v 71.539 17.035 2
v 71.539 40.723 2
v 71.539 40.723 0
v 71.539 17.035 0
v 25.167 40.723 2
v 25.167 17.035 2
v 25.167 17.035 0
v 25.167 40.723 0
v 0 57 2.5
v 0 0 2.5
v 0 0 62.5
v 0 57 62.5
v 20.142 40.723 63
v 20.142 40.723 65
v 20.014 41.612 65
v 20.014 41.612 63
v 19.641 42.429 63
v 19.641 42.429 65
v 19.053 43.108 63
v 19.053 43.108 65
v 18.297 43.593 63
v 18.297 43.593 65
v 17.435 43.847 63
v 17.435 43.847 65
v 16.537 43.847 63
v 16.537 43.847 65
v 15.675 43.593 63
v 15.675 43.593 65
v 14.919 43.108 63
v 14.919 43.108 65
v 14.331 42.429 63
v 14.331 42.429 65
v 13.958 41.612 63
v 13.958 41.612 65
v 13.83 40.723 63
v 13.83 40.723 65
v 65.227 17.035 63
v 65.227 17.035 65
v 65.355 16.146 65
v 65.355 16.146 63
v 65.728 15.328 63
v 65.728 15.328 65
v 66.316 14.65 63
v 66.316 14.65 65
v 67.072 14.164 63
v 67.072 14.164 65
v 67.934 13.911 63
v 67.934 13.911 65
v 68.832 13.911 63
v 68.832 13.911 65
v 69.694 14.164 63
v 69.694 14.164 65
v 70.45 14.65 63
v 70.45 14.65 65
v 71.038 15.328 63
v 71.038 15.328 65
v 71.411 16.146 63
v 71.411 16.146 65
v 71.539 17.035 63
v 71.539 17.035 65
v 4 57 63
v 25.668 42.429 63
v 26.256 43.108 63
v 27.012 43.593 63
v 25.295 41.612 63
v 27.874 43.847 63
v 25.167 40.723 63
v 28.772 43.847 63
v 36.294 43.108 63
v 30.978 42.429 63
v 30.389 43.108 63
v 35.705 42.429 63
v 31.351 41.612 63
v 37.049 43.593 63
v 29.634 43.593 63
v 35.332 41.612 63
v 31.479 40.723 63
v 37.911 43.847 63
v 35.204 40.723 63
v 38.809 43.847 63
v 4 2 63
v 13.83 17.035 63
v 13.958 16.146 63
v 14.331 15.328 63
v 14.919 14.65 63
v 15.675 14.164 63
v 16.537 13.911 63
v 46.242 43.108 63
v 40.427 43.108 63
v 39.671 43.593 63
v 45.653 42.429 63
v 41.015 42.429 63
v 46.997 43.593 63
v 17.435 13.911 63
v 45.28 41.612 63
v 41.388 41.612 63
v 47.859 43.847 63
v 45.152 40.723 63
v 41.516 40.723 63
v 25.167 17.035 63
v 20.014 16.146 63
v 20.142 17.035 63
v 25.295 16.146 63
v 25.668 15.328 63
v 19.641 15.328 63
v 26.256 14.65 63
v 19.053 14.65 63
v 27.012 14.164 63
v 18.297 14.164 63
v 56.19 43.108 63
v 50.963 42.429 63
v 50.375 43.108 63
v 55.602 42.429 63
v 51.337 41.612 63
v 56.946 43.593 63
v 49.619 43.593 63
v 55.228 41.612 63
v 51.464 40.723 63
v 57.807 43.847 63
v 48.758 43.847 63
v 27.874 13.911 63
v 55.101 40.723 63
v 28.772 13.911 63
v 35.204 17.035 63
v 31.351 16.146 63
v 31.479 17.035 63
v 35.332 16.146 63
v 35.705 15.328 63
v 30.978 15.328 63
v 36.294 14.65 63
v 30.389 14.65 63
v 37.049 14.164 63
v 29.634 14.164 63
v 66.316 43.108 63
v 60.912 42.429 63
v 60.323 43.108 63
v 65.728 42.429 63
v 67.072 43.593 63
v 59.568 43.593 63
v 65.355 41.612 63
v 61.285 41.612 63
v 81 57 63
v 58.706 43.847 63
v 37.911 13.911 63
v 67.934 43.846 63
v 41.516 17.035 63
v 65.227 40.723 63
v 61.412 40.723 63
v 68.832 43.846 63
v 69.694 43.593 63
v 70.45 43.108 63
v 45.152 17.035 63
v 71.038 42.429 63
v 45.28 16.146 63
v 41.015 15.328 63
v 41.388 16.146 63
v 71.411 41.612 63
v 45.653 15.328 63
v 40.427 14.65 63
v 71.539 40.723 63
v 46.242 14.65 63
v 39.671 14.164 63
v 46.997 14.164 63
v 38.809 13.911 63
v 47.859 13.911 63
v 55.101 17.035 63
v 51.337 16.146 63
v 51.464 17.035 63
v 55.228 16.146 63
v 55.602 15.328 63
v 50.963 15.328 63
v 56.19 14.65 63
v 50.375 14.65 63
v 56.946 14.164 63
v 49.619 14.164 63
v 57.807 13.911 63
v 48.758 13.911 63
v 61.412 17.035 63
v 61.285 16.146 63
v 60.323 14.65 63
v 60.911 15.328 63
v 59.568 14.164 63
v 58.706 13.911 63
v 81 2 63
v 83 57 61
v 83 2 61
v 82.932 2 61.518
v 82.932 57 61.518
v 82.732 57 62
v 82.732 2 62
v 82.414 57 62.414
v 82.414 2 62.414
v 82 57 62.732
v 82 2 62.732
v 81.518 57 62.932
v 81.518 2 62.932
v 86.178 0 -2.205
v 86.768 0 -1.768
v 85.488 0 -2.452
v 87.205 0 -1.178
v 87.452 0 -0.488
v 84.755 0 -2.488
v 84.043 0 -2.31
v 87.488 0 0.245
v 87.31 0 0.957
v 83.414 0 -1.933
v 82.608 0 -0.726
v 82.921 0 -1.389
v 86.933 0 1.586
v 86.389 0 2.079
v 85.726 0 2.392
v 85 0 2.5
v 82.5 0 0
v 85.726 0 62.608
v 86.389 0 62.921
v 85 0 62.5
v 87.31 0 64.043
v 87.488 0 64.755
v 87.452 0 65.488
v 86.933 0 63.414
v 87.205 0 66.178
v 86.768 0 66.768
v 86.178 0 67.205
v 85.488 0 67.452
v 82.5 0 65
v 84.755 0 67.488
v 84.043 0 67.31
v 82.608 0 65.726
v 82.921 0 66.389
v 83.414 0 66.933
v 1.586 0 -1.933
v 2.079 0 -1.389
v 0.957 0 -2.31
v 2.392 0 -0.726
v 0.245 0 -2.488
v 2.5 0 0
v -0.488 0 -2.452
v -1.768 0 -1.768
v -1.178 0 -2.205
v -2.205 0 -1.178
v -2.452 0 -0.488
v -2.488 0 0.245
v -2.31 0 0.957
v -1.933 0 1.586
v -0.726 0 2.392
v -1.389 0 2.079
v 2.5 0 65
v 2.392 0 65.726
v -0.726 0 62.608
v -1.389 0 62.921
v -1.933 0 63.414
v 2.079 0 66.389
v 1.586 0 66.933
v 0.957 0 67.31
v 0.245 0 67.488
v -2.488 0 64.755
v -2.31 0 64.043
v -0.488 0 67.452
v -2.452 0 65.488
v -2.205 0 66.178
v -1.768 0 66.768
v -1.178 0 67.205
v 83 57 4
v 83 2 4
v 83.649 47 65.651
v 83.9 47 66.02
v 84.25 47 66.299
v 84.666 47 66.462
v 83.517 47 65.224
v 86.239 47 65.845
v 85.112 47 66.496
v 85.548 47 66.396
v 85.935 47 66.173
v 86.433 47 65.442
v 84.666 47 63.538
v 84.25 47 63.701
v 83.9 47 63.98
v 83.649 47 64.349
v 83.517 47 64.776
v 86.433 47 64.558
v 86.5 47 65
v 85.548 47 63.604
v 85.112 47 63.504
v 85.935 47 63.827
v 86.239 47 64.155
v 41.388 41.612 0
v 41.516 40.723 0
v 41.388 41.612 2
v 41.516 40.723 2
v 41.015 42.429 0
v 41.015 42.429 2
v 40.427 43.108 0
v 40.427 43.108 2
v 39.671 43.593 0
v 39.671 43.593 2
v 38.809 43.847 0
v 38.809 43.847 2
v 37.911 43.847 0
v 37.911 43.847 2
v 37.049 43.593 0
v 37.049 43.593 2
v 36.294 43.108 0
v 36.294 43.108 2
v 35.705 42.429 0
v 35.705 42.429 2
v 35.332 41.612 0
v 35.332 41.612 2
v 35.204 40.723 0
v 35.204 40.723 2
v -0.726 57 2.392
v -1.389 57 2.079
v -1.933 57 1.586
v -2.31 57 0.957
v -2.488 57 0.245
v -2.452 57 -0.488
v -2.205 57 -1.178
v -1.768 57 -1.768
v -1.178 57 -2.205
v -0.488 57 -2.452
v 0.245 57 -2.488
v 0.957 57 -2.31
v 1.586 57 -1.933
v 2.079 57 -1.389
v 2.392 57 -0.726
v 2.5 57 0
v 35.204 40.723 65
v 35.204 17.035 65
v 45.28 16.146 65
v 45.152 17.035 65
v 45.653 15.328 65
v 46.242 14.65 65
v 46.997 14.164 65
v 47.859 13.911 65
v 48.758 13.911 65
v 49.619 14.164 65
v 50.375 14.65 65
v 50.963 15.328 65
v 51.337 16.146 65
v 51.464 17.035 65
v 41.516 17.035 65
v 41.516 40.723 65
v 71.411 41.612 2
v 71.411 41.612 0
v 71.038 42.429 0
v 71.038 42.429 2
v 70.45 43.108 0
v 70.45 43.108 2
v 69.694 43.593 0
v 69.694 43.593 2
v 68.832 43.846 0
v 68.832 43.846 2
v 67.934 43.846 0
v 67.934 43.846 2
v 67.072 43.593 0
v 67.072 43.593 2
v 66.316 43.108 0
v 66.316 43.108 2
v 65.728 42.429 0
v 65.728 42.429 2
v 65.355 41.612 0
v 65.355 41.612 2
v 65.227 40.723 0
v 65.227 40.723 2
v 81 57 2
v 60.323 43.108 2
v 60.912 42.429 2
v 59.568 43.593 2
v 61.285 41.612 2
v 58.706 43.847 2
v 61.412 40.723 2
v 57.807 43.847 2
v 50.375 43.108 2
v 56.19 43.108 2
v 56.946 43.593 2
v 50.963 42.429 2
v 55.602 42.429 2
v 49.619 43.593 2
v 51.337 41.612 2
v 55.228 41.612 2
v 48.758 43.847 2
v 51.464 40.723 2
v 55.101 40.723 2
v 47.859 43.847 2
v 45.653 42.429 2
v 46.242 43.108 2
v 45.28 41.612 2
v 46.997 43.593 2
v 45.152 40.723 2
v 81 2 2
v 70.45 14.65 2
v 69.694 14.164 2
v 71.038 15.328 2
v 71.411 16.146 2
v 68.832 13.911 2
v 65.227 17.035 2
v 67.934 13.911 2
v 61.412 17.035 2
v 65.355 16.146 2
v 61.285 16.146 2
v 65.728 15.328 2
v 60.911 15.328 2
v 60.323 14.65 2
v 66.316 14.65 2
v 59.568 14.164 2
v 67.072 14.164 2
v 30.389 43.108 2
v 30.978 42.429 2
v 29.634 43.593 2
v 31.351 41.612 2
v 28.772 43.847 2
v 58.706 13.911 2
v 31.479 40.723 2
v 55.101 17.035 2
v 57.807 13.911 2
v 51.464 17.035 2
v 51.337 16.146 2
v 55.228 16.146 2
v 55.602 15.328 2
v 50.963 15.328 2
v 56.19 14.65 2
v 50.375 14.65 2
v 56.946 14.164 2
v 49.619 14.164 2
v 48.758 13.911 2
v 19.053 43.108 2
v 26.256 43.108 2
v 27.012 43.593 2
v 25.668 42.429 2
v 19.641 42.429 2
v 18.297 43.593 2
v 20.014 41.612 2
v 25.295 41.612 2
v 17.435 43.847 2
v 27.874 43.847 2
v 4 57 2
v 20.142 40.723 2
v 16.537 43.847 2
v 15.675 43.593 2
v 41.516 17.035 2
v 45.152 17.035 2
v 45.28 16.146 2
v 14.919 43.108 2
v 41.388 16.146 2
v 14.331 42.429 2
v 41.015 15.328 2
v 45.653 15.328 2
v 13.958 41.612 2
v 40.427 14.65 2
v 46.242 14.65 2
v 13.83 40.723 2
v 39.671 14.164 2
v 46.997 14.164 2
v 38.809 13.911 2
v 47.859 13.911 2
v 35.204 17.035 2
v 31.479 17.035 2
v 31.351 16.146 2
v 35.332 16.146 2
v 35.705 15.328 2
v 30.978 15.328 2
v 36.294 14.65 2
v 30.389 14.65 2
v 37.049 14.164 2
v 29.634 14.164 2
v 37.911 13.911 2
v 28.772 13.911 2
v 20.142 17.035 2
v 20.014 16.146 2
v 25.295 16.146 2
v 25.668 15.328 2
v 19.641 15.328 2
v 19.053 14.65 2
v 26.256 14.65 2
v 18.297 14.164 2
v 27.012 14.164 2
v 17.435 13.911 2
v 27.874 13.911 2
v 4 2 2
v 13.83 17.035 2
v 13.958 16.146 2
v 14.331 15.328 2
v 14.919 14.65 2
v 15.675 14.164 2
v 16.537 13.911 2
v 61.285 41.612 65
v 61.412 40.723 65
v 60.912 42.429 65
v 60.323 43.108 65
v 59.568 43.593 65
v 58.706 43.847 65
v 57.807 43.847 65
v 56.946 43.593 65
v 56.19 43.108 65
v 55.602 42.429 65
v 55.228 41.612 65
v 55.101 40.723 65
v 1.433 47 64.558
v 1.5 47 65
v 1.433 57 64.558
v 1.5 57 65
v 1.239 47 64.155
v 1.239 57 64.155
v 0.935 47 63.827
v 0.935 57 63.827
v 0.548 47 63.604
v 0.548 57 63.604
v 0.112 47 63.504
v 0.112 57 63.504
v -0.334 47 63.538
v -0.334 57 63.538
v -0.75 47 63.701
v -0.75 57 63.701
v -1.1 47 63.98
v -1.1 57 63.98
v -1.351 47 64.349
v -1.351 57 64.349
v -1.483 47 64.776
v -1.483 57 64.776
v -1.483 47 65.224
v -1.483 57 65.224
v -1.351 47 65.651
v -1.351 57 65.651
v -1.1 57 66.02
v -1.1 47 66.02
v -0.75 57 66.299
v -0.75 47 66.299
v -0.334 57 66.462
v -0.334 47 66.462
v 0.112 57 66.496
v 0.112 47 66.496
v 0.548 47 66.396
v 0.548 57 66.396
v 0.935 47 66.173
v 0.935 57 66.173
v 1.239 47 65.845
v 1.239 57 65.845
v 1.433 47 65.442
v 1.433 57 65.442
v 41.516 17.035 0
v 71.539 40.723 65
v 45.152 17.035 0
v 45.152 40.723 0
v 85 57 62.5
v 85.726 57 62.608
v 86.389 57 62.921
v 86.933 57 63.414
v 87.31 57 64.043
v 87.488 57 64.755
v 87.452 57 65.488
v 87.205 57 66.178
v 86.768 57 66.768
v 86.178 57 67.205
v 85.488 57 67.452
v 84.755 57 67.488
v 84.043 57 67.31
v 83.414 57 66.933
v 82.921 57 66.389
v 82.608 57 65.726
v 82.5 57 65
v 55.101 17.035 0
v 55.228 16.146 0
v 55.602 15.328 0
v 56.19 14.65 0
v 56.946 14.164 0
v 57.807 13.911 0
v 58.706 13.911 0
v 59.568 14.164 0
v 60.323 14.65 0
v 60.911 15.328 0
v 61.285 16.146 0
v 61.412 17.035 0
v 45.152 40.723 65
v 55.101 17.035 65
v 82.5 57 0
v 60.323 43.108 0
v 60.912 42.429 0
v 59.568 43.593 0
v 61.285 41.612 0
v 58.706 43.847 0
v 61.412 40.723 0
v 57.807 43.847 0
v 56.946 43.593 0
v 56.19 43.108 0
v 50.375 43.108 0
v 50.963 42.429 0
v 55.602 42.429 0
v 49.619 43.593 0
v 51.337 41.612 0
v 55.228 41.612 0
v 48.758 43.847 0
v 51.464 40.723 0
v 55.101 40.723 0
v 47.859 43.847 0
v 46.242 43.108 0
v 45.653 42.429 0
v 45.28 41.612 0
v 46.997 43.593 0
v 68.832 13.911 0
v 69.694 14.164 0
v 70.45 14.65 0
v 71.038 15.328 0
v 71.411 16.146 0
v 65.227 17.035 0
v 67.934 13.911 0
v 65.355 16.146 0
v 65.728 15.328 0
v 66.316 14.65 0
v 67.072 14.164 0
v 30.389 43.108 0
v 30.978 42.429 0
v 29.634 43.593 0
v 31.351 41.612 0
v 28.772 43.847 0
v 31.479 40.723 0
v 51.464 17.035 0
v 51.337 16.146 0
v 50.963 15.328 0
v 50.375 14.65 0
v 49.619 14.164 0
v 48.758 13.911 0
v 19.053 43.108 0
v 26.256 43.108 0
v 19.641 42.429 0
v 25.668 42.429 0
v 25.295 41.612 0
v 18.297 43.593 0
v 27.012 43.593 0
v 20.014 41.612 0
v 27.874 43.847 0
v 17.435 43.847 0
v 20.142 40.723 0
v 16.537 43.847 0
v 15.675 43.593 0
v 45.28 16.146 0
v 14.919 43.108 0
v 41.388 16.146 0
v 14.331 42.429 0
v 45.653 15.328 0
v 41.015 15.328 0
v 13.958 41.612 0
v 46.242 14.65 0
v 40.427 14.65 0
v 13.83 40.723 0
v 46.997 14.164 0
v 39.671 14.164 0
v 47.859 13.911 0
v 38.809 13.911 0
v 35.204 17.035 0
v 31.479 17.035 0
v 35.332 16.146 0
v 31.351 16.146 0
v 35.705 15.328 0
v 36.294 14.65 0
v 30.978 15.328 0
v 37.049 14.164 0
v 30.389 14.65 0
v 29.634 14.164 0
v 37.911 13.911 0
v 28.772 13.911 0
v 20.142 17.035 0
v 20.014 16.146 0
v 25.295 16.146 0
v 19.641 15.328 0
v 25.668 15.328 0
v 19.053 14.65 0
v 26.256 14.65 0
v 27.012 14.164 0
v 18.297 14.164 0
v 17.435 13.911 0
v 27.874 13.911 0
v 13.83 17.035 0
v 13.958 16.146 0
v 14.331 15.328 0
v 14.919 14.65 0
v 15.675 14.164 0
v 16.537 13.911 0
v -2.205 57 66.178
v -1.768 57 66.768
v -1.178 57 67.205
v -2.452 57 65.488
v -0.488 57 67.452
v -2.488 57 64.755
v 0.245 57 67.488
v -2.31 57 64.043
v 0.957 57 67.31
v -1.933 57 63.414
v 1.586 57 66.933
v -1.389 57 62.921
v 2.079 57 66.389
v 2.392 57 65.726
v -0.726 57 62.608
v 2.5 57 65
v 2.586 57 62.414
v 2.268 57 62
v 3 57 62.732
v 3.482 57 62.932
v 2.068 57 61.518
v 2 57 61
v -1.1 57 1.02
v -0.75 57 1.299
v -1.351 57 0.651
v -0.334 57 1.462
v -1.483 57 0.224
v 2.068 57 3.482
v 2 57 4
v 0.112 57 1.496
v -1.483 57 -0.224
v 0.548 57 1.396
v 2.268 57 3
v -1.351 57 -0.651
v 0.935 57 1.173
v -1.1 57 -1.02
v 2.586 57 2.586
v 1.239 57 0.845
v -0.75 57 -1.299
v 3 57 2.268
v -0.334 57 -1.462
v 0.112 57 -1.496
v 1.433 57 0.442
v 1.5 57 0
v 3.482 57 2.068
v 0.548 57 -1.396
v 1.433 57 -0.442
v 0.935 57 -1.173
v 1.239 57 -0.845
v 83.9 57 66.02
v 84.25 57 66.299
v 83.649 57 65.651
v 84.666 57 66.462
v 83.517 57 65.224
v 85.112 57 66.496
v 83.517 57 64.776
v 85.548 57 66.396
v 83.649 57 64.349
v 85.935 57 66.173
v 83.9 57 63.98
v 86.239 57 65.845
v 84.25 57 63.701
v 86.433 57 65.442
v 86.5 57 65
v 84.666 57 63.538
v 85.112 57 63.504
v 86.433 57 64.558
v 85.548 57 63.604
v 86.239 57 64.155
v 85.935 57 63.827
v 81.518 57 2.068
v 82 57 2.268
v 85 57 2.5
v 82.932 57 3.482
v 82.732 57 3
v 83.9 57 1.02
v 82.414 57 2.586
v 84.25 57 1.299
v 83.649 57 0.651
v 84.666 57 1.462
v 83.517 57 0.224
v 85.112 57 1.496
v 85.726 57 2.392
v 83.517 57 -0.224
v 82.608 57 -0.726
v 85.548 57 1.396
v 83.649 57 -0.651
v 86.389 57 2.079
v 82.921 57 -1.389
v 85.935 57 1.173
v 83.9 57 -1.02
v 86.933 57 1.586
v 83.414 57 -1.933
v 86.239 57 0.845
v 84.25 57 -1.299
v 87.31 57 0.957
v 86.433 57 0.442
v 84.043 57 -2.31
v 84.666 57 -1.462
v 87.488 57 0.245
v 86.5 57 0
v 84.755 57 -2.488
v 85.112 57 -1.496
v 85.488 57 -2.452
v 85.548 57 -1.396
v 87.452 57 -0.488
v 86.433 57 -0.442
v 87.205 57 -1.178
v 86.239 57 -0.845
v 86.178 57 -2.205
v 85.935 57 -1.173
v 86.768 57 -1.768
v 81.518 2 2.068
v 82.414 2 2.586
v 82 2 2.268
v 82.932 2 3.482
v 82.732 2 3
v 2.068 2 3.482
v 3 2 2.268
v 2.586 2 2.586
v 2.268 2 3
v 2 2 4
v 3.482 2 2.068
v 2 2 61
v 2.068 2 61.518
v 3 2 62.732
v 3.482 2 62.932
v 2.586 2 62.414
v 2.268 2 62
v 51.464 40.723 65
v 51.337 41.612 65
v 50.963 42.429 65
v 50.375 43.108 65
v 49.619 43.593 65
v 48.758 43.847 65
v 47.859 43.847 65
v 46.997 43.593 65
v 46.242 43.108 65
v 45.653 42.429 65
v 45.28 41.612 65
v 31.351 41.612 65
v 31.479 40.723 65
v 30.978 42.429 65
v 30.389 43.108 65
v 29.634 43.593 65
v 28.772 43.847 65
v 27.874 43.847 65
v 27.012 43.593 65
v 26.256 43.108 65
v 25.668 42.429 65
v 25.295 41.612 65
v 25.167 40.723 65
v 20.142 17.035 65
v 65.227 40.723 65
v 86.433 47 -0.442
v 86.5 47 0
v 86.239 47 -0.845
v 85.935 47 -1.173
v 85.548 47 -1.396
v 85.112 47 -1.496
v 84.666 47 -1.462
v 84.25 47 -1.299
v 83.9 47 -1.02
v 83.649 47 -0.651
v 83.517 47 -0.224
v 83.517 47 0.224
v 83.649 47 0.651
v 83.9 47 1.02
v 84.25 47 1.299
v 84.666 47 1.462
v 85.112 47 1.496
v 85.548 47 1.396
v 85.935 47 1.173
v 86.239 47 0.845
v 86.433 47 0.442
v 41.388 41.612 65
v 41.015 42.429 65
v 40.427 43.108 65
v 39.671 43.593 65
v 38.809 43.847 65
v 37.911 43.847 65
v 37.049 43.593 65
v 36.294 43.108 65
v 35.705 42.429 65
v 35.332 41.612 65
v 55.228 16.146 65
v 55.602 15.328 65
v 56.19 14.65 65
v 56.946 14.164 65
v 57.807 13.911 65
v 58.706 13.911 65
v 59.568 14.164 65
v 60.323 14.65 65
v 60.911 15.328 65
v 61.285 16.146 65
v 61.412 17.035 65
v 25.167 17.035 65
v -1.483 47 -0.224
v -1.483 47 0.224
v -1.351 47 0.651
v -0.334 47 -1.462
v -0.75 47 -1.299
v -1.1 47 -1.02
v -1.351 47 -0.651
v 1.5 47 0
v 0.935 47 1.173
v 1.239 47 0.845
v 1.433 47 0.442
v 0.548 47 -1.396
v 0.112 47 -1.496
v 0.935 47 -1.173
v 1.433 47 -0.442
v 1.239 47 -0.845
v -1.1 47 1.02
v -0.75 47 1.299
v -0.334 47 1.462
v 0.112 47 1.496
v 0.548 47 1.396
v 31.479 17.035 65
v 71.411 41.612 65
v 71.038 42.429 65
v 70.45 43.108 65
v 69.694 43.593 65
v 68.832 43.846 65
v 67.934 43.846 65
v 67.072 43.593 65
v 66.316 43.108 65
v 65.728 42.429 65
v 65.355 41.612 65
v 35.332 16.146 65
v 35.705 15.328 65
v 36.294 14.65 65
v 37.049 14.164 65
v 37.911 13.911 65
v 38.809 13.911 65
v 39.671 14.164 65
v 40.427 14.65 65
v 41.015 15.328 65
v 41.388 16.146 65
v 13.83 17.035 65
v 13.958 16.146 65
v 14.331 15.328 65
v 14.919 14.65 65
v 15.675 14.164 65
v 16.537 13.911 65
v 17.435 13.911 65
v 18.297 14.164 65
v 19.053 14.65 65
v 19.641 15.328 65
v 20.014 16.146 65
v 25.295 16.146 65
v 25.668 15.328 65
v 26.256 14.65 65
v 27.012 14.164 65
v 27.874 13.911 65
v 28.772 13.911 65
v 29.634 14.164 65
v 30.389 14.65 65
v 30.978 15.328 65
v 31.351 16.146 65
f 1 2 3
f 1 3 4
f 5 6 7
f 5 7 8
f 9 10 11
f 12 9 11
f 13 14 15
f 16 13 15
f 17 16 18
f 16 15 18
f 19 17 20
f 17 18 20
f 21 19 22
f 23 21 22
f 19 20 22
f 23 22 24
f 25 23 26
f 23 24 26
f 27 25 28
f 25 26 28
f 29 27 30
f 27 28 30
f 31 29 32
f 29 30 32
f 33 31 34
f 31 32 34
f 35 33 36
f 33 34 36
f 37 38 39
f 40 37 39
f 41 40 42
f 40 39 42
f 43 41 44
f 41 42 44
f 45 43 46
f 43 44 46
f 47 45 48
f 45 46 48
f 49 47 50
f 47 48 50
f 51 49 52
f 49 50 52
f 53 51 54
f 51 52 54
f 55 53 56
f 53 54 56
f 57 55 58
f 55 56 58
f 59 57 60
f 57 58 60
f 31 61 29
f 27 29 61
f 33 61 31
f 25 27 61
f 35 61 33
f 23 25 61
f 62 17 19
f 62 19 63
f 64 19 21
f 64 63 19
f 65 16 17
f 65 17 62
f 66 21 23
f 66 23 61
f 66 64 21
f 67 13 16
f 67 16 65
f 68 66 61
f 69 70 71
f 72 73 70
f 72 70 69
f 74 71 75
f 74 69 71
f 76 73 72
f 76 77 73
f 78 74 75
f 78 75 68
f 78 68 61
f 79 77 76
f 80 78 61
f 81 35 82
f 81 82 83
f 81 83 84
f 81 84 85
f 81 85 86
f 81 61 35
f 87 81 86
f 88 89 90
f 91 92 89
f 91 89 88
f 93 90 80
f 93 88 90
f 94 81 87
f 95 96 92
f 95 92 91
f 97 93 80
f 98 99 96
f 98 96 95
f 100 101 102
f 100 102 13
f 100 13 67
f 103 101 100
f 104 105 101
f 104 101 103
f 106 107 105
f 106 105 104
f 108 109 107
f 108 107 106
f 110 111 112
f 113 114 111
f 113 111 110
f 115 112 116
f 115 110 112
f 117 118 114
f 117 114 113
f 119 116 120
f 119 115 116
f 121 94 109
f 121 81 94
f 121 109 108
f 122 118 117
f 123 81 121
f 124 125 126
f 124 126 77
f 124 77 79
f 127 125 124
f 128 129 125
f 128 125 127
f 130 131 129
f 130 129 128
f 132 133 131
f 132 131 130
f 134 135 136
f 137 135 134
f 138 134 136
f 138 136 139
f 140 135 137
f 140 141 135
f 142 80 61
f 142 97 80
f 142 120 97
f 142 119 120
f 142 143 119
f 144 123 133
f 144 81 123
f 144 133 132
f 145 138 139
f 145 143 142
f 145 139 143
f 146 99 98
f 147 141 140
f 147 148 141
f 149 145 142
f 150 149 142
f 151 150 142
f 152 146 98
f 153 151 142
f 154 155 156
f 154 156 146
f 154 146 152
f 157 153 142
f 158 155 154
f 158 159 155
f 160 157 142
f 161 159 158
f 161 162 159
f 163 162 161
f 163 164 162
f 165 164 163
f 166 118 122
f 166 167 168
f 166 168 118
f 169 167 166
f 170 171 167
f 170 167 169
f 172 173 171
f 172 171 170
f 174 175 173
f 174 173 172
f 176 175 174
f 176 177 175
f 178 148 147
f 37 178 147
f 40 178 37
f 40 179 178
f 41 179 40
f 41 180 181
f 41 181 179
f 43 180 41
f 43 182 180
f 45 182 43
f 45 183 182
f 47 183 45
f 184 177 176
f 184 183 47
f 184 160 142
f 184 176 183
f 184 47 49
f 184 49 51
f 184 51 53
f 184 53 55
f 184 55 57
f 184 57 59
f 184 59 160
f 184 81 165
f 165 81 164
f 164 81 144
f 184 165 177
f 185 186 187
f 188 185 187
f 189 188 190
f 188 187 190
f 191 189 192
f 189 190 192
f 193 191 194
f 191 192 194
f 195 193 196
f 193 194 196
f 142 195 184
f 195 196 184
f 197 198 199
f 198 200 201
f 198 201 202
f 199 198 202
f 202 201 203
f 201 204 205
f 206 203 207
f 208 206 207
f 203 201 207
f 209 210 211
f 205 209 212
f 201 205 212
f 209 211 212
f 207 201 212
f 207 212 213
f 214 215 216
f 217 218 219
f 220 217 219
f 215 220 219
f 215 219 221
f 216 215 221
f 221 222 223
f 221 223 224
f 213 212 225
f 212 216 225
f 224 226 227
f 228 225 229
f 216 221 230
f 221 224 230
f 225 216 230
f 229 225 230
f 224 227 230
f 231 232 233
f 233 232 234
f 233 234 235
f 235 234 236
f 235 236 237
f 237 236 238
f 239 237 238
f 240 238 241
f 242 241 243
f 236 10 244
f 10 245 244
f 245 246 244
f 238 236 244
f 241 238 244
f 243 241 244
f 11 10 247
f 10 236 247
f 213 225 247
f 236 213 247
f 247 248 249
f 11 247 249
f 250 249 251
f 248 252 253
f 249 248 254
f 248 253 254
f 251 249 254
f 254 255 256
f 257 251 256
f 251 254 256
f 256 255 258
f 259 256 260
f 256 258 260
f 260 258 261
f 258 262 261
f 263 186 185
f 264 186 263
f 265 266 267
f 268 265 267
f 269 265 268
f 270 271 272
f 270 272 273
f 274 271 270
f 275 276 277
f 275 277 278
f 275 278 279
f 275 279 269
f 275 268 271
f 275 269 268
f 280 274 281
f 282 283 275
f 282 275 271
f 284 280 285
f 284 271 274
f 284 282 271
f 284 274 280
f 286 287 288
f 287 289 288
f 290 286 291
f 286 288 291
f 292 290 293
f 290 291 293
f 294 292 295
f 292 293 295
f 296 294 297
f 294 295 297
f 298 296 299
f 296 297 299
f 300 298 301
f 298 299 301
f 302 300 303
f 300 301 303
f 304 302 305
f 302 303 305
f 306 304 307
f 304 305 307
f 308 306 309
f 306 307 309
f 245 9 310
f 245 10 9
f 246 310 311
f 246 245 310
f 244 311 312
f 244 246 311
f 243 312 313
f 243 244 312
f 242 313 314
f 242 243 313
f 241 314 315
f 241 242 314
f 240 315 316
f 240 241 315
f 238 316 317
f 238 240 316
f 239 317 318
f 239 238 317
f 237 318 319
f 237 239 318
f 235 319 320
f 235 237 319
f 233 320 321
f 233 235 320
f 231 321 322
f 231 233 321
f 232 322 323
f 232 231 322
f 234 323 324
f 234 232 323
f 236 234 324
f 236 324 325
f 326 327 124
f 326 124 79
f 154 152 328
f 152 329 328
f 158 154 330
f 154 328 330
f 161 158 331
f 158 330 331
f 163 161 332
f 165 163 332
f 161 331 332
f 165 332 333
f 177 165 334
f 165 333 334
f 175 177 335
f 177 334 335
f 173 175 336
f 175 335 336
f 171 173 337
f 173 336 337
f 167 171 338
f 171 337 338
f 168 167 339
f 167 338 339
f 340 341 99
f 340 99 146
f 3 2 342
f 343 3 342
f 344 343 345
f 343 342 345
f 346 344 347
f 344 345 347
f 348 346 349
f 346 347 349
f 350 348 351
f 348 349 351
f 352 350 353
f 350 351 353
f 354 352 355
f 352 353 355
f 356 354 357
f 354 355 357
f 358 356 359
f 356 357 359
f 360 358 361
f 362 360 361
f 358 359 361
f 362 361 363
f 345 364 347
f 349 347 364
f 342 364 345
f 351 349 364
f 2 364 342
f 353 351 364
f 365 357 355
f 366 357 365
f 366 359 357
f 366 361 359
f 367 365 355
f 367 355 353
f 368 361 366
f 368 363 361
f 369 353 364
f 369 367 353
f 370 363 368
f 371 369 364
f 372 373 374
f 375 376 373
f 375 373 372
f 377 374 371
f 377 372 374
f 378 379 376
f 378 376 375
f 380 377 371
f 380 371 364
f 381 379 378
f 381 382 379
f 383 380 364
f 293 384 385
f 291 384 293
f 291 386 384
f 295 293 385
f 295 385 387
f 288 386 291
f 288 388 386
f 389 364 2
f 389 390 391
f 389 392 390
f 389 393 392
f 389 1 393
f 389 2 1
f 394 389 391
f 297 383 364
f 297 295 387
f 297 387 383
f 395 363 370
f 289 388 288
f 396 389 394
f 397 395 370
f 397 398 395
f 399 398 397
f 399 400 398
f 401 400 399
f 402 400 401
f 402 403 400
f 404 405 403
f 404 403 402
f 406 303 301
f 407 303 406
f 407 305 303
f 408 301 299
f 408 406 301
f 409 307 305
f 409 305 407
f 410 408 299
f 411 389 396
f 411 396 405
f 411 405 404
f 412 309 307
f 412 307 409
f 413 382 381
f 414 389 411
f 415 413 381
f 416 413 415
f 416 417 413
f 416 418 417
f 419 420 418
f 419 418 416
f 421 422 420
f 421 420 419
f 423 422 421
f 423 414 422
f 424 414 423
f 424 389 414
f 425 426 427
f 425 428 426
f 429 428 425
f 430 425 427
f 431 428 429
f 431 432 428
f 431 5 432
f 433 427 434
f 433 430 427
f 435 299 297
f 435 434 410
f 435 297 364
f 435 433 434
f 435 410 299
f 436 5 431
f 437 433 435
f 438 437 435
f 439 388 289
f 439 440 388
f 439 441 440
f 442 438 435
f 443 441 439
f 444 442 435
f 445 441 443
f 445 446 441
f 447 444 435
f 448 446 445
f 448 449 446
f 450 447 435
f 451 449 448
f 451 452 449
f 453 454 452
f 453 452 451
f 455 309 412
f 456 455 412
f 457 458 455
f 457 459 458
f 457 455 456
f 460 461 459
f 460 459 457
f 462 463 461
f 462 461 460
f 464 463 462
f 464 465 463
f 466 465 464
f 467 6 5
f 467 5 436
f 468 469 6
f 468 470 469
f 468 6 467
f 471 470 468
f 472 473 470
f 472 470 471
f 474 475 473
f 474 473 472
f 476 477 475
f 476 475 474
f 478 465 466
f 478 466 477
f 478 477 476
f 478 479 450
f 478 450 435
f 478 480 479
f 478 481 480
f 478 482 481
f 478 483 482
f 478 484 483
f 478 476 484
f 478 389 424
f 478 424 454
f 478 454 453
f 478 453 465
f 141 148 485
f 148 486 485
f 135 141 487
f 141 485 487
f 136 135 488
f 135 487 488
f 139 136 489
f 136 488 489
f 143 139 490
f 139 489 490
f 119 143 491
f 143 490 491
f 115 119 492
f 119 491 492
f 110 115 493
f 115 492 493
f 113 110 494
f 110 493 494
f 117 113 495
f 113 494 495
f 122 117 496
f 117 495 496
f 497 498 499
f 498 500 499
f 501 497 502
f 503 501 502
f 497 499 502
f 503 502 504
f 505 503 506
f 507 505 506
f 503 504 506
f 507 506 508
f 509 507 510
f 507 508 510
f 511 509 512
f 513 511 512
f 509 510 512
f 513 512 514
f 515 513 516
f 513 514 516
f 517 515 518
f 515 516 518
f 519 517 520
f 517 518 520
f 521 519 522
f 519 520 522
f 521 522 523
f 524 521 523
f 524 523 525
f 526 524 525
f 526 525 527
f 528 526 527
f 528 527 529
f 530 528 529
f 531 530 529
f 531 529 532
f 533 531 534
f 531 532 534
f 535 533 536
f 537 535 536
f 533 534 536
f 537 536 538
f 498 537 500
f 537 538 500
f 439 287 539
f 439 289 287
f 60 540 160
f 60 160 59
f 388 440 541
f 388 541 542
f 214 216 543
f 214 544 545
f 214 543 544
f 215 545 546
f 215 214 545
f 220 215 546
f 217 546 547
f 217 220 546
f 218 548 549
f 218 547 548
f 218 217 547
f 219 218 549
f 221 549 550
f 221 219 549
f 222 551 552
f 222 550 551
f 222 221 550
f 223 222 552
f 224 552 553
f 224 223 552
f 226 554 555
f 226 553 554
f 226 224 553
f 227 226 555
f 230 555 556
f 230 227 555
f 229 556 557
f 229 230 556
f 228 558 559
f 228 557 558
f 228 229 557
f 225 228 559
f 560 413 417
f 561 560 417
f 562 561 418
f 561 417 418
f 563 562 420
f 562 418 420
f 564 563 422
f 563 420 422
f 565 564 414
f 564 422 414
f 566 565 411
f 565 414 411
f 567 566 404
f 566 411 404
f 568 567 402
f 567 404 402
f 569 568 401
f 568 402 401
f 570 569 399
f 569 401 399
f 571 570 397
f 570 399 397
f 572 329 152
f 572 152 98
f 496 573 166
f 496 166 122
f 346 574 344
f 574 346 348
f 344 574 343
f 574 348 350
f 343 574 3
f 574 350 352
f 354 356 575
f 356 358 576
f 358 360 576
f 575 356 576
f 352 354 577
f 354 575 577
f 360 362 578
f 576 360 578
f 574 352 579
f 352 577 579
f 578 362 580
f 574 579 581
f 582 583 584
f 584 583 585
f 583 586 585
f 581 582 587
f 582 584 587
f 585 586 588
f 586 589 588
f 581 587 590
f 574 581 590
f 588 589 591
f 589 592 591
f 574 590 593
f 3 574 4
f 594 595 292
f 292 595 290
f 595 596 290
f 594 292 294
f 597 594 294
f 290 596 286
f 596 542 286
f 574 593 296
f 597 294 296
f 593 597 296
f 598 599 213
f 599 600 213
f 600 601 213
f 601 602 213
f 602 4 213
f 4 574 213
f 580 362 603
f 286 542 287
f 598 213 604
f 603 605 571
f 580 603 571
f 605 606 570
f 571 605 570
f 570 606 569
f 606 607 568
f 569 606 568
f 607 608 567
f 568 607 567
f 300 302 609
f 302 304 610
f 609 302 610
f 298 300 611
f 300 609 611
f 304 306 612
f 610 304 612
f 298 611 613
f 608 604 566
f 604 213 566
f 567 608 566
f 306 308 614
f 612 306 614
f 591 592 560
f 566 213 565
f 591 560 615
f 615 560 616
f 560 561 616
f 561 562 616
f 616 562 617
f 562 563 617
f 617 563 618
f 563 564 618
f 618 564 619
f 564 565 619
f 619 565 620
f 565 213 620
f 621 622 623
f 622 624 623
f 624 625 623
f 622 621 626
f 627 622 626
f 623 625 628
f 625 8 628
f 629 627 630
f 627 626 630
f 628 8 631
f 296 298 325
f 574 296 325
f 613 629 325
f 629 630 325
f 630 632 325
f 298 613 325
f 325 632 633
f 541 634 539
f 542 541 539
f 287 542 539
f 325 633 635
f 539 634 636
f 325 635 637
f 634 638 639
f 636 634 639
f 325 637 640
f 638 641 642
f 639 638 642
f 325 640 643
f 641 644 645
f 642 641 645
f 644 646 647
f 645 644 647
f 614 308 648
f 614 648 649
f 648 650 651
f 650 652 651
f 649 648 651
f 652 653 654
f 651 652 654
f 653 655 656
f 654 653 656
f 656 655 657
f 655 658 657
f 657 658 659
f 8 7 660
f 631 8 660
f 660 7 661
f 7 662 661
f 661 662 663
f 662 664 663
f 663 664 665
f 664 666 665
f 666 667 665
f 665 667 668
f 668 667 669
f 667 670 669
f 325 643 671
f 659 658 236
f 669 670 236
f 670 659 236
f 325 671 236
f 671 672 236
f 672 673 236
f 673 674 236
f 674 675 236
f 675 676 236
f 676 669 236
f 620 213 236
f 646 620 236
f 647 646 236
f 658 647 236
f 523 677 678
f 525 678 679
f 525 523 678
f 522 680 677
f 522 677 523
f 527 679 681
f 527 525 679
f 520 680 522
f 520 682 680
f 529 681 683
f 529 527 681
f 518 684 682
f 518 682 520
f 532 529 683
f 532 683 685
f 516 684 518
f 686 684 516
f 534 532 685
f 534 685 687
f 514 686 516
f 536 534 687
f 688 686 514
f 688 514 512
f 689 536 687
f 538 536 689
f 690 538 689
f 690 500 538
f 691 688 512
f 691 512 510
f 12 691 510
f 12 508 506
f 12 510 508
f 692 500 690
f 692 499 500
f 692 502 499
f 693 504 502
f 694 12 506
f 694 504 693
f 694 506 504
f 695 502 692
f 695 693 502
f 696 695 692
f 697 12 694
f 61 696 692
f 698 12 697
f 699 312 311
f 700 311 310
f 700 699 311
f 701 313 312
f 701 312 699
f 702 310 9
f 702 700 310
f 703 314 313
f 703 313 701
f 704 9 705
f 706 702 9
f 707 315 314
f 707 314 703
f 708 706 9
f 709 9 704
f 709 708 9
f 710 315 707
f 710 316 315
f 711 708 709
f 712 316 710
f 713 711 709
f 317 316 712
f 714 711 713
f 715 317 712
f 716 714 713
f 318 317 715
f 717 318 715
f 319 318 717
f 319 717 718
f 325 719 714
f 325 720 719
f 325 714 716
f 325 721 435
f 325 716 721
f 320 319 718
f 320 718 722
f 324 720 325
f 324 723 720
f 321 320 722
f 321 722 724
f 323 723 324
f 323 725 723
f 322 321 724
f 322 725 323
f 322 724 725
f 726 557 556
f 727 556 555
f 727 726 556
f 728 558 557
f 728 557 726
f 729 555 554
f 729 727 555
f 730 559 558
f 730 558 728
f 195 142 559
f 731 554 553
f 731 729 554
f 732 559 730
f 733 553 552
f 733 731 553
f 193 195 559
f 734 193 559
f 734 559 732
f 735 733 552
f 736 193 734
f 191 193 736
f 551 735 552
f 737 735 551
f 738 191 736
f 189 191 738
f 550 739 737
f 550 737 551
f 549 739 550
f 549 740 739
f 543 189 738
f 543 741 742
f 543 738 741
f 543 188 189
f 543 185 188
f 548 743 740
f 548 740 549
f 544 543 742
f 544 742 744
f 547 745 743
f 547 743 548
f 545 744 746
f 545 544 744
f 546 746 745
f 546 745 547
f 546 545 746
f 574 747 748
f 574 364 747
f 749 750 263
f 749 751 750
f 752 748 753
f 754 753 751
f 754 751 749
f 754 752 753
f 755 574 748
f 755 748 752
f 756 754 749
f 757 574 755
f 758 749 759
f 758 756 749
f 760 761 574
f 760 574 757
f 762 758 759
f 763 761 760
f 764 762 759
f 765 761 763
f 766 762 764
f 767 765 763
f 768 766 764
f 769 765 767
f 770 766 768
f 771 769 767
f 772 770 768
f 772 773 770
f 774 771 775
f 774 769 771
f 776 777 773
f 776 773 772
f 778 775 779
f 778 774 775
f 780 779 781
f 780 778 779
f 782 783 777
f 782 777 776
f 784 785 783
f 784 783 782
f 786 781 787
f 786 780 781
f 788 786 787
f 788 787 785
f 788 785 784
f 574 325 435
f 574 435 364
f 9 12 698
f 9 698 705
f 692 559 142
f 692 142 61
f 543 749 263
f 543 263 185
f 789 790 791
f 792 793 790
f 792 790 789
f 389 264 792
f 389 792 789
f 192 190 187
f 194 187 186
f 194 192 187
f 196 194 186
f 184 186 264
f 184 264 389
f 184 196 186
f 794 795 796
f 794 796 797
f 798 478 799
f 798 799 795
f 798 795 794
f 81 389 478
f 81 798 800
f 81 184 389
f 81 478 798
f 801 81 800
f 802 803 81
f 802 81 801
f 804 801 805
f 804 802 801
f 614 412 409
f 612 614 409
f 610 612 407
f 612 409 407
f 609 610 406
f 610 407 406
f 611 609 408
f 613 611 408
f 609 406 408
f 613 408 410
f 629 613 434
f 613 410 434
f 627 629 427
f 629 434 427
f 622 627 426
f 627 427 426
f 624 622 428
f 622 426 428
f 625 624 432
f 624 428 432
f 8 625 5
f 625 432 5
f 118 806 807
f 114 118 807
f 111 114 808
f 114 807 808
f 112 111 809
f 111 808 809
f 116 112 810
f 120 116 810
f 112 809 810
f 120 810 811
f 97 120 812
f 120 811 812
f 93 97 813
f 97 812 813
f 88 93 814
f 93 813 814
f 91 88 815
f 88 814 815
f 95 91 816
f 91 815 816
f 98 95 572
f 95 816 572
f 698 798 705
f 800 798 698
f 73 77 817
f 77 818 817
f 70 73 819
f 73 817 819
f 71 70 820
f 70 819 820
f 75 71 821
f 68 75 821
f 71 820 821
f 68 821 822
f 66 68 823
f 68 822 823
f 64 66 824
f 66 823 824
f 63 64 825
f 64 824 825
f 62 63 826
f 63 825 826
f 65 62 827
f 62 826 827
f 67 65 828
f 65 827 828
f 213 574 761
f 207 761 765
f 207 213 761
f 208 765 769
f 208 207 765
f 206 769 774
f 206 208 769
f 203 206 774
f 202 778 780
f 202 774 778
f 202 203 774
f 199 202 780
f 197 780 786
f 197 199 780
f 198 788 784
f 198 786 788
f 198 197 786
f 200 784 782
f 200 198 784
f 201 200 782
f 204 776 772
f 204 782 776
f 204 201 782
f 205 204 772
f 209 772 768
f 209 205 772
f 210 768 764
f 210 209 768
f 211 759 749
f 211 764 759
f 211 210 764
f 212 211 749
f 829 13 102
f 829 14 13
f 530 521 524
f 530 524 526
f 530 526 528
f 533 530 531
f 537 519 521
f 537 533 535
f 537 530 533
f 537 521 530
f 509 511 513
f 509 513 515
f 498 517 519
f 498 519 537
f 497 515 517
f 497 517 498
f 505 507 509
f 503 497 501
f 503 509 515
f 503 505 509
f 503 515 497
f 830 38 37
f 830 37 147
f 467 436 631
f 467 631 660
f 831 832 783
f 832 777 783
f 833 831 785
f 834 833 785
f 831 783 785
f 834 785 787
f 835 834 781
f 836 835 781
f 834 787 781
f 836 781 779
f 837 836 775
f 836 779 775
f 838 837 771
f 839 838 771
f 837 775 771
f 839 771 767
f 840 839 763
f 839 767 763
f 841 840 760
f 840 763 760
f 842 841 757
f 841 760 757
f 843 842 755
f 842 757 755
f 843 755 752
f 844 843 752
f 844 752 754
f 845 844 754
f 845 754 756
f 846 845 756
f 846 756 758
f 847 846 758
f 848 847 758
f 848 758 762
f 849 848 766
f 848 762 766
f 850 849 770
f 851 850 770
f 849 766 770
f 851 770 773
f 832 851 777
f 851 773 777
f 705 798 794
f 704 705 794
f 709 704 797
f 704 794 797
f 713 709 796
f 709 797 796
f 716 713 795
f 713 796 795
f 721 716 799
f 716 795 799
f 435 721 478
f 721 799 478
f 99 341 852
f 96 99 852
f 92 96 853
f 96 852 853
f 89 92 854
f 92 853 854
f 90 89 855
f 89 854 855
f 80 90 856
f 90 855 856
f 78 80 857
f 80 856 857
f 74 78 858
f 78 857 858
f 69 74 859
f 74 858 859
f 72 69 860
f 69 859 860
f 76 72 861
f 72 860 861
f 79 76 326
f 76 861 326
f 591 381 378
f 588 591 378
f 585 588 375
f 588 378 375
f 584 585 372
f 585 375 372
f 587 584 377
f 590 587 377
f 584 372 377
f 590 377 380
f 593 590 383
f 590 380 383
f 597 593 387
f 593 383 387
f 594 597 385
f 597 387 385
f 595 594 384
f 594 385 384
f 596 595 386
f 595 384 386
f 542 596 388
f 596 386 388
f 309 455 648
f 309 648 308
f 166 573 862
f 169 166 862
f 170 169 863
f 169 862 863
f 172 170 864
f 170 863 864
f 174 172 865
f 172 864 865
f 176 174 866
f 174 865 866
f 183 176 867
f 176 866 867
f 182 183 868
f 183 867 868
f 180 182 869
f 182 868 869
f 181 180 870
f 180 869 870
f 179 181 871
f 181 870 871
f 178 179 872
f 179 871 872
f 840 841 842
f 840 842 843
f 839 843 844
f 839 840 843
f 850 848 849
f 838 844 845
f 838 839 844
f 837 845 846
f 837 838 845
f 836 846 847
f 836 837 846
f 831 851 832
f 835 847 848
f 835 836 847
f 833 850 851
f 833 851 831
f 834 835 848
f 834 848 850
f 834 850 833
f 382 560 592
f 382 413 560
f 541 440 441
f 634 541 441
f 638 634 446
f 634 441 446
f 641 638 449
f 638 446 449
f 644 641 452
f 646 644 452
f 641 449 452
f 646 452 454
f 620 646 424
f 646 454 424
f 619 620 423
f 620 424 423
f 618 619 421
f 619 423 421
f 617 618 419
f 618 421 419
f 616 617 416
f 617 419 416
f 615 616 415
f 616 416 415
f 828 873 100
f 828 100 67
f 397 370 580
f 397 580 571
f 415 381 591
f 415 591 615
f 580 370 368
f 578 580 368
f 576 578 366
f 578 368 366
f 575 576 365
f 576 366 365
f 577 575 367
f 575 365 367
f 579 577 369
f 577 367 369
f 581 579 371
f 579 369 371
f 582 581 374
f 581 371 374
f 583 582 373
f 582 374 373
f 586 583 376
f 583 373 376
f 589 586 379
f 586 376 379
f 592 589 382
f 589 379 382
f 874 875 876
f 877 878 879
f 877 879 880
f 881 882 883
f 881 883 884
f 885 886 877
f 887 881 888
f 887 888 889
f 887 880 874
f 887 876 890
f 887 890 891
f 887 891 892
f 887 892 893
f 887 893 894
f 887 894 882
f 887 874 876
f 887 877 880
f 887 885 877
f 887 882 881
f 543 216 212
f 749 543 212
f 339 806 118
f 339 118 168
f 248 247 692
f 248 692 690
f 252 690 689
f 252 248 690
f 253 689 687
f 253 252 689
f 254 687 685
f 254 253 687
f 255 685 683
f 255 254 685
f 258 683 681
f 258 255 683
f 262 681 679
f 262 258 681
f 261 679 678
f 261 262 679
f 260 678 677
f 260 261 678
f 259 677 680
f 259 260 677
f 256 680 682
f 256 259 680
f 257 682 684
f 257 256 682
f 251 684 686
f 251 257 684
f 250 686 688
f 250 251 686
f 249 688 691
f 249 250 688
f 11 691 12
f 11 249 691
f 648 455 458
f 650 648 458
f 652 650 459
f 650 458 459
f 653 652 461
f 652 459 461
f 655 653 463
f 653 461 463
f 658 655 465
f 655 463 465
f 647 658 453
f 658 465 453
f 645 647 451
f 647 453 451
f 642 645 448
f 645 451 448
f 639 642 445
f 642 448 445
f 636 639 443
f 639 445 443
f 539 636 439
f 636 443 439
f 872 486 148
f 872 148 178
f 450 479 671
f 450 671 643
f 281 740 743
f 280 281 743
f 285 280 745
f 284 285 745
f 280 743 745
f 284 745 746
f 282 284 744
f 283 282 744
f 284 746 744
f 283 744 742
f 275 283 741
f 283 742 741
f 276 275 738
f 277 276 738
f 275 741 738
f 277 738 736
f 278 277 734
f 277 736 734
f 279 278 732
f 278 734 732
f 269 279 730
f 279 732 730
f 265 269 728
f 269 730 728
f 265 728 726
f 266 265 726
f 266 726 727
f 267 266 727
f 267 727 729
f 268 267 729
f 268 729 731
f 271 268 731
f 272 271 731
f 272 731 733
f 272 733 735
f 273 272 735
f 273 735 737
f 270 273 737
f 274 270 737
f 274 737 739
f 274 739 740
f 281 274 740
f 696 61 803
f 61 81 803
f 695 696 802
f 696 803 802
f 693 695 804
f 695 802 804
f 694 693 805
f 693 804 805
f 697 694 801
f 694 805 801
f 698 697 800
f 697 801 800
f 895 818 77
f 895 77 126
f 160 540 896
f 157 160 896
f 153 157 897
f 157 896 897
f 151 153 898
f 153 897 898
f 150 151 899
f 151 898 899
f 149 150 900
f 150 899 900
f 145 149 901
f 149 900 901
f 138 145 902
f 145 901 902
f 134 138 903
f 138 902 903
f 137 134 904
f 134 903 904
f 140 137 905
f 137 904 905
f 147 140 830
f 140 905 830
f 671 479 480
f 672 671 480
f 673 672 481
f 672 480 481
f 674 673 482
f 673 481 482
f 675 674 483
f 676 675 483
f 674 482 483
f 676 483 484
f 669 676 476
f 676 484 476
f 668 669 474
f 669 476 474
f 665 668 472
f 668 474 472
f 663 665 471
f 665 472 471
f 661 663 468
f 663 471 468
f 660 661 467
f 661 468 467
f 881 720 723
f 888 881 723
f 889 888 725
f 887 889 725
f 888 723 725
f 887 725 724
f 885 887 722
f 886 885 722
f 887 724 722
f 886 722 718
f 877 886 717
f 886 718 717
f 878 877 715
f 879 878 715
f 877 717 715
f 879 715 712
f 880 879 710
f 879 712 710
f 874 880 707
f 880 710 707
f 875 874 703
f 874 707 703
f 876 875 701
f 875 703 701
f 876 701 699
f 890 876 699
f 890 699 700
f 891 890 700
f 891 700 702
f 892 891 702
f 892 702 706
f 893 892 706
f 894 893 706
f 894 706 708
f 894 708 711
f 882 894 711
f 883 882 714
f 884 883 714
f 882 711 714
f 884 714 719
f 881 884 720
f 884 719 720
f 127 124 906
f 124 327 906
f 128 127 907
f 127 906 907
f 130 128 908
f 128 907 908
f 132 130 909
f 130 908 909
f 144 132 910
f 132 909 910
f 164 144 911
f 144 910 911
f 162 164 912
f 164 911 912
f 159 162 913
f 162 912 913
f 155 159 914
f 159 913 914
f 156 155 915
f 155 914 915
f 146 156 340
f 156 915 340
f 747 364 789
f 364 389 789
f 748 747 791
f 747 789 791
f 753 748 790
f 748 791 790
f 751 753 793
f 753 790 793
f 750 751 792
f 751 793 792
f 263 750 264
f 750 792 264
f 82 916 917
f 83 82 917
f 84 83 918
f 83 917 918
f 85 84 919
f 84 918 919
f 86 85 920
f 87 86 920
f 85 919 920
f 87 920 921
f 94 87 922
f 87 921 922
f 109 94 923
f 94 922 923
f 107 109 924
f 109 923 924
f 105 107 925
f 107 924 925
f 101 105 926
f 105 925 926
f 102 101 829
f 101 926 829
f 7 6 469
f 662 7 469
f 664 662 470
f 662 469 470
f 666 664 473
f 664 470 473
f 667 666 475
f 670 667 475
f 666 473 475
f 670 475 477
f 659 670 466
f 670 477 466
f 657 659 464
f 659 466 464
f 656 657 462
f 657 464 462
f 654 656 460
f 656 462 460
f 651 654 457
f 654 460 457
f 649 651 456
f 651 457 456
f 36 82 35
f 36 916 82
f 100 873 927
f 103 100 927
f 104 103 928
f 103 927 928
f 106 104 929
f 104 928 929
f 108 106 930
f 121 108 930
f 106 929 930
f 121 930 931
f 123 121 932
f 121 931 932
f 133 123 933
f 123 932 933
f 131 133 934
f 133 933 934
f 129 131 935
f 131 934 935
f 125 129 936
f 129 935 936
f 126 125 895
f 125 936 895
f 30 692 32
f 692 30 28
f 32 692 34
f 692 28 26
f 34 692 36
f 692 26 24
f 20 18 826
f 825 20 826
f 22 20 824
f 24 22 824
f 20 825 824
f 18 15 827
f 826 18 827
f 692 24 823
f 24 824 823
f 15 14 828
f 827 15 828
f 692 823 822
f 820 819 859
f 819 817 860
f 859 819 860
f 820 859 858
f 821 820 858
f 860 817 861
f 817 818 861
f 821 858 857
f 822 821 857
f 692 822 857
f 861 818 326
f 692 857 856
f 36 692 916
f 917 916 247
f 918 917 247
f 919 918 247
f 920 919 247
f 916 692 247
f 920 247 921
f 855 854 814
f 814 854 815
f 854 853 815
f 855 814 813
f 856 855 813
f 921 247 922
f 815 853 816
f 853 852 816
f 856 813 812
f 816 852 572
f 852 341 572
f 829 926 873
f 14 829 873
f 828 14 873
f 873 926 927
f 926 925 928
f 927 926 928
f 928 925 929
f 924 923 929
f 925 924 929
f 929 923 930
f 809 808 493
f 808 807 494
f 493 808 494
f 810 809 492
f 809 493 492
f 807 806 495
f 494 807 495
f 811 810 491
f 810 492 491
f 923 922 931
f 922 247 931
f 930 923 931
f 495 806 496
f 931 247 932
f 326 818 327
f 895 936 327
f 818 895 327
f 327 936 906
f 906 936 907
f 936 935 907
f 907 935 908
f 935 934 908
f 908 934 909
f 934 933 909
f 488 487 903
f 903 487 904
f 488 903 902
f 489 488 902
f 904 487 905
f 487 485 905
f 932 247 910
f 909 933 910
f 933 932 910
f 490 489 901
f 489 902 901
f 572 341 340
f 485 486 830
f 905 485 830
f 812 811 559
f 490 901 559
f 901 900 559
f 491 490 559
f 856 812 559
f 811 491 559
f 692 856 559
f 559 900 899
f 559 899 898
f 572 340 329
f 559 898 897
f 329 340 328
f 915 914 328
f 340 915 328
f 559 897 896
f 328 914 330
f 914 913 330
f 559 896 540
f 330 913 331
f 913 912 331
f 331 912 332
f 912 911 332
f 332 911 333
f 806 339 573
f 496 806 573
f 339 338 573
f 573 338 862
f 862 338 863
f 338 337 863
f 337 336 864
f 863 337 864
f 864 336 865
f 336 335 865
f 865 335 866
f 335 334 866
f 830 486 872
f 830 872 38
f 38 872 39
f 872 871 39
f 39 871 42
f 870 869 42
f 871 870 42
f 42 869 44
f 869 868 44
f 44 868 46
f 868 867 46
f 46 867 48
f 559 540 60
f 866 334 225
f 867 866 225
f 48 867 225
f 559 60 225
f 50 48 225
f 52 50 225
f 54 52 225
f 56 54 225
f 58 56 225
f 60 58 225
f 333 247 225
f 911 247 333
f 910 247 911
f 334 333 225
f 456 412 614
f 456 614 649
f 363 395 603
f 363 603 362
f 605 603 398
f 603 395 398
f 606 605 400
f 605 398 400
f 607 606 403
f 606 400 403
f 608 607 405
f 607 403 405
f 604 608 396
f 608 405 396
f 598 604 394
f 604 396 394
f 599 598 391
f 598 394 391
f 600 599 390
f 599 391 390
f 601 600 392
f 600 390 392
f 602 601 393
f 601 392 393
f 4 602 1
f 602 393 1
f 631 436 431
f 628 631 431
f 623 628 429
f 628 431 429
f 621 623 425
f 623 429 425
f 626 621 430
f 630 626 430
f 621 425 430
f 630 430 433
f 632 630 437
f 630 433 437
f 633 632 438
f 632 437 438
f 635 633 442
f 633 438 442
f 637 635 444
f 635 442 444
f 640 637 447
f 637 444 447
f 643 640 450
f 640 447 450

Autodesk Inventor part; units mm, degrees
ref_plane "YZ Plane" through (0, 0, 0) normal (1, 0, 0) x (0, 1, 0)
ref_plane "XZ Plane" through (0, 0, 0) normal (0, 1, 0) x (-1, 0, 0)
ref_plane "XY Plane" through (0, 0, 0) normal (0, 0, 1) x (1, 0, 0)
sketch "Sketch1" plane through (0, 0, 0) normal (0, 1, 0) x (-1, 0, 0)
  line L0 (0, 0) -> (-85, 0)
  line L1 (-85, 0) -> (-85, 65)
  line L2 (-85, 65) -> (0, 65)
  line L3 (0, 65) -> (0, 0)
  line L4 (-4, 2) -> (-81, 2)
  line L5 (-83, 4) -> (-83, 61)
  line L6 (-81, 63) -> (-4, 63)
  line L7 (-2, 61) -> (-2, 4)
  circle A0 centre (0, 0) radius 2.5
  circle A1 centre (0, 65) radius 2.5
  circle A2 centre (-85, 65) radius 2.5
  circle A3 centre (-85, 0) radius 2.5
  arc A4 (-4, 2) -> (-2, 4) centre (-4, 4) ccw
  arc A5 (-83, 4) -> (-81, 2) centre (-81, 4) ccw
  arc A6 (-81, 63) -> (-83, 61) centre (-81, 61) ccw
  arc A7 (-2, 61) -> (-4, 63) centre (-4, 61) ccw
  point P0 (0, 62.5)
  point P1 (-2.5, 65)
  point P2 (-82.5, 65)
  point P3 (-85, 62.5)
  point P4 (-85, 2.5)
  point P5 (-82.5, 0)
  point P6 (-2.5, 0)
  point P7 (0, 2.5)
  dimension "d0" = 85
  dimension "d1" = 65
  dimension "d14" = 5
  dimension "d15" = 5
  dimension "d16" = 5
  dimension "d17" = 5
  dimension "d18" = 2
extrude "Extrusion1" add sketch "Sketch1" along normal blind 2 contours A3 L1 L0 | A3 L1 A2 L2 A1 L3 A0 L0 | L0 L1 A3 | A0 L3 L0 | L0 L3 A0 | A2 L2 L1 | L1 L2 A2 | A1 L2 L3 | L3 L2 A1 | L4 A5 L5 A6 L6 A7 L7 A4
sketch "Sketch2" plane through (0, 2, 0) normal (0, 1, 0) x (1, 0, 0)
  line L0 (2.5, -65) -> (82.5, -65) projected
  arc A0 (82.5, -65) -> (85, -62.5) centre (85, -65) ccw projected
  line L1 (85, -62.5) -> (85, -2.5) projected
  arc A1 (85, -2.5) -> (82.5, 0) centre (85, 0) ccw projected
  line L2 (82.5, 0) -> (2.5, 0) projected
  arc A2 (2.5, 0) -> (0, -2.5) centre (0, 0) ccw projected
  line L3 (0, -2.5) -> (0, -62.5) projected
  arc A3 (0, -62.5) -> (2.5, -65) centre (0, -65) ccw projected
  line L4 (81, -2) -> (4, -2)
  line L5 (2, -4) -> (2, -61)
  line L6 (4, -63) -> (81, -63)
  line L7 (83, -61) -> (83, -4)
  arc A4 (2, -61) -> (4, -63) centre (4, -61) ccw
  arc A5 (4, -2) -> (2, -4) centre (4, -4) ccw
  arc A6 (81, -63) -> (83, -61) centre (81, -61) ccw
  arc A7 (83, -4) -> (81, -2) centre (81, -4) ccw
  dimension "d25" = 2
extrude "Extrusion2" add sketch "Sketch2" along normal blind 55
sketch "Sketch3" plane through (2.5, 0, 65) normal (0, 0, 1) x (1, 0, 0)
  line L0 (11.33, 17.0347) -> (11.33, 40.7227)
  line L1 (17.642, 40.7227) -> (17.642, 17.0347)
  arc A0 (11.33, 17.0347) -> (17.642, 17.0347) centre (14.486, 17.0347) ccw
  arc A1 (17.642, 40.7227) -> (11.33, 40.7227) centre (14.486, 40.7227) ccw
  line L2 (22.6667, 17.0347) -> (22.6667, 40.7227)
  line L3 (28.9787, 40.7227) -> (28.9787, 17.0347)
  arc A2 (22.6667, 17.0347) -> (28.9787, 17.0347) centre (25.8227, 17.0347) ccw
  arc A3 (28.9787, 40.7227) -> (22.6667, 40.7227) centre (25.8227, 40.7227) ccw
  line L4 (32.7043, 17.0347) -> (32.7043, 40.7227)
  line L5 (39.0162, 40.7227) -> (39.0162, 17.0347)
  arc A4 (32.7043, 17.0347) -> (39.0162, 17.0347) centre (35.8602, 17.0347) ccw
  arc A5 (39.0162, 40.7227) -> (32.7043, 40.7227) centre (35.8602, 40.7227) ccw
  line L6 (42.6524, 17.0347) -> (42.6524, 40.7227)
  line L7 (48.9644, 40.7227) -> (48.9644, 17.0347)
  arc A6 (42.6524, 17.0347) -> (48.9644, 17.0347) centre (45.8084, 17.0347) ccw
  arc A7 (48.9644, 40.7227) -> (42.6524, 40.7227) centre (45.8084, 40.7227) ccw
  line L8 (52.6006, 17.0347) -> (52.6006, 40.7227)
  line L9 (58.9125, 40.7227) -> (58.9125, 17.0347)
  arc A8 (52.6006, 17.0347) -> (58.9125, 17.0347) centre (55.7565, 17.0347) ccw
  arc A9 (58.9125, 40.7227) -> (52.6006, 40.7227) centre (55.7565, 40.7227) ccw
  line L10 (62.7271, 17.0347) -> (62.7271, 40.7227)
  line L11 (69.039, 40.7227) -> (69.039, 17.0347)
  arc A10 (62.7271, 17.0347) -> (69.039, 17.0347) centre (65.8831, 17.0347) ccw
  arc A11 (69.039, 40.7227) -> (62.7271, 40.7227) centre (65.8831, 40.7227) ccw
  point P0 (-2.5, 0)
  point P1 (14.486, 28.8787)
  point P2 (25.8227, 28.8787)
  point P3 (35.8602, 28.8787)
  point P4 (45.8084, 28.8787)
  point P5 (55.7565, 28.8787)
  point P6 (65.8831, 28.8787)
extrude "Extrusion3" cut sketch "Sketch3" against normal blind 70
sketch "Sketch4" plane through (0, 0, 2.5) normal (-1, 0, 0) x (0, 0, 1)
  line L0 (0, 0) -> (60, 0) projected
  line L1 (60, 0) -> (60, 57) projected
  line L2 (0, 57) -> (60, 57) projected
  line L3 (0, 0) -> (0, 57) projected
  line L4 (0, 28.5) -> (10, 28.5)
  line L5 (60, 28.5) -> (49.7848, 28.5)
  point P0 (-2.5, 0)
  dimension "d44" = 10
sketch "Sketch6" plane through (0, 57, 0) normal (0, 1, 0) x (1, 0, 0)
  arc A0 (0, -62.5) -> (2.5, -65) centre (0, -65) ccw projected
  line L0 (81, -63) -> (4, -63) projected
  line L1 (2, -61) -> (2, -4) projected
  circle A1 centre (0, -65) radius 1.5
  line L2 (45.4192, -32.5) -> (-3.1549, -32.5)
  circle A2 centre (0, 0) radius 1.5
  circle A3 centre (85, -65) radius 1.5
  circle A4 centre (85, 0) radius 1.5
  dimension "d45" = 3
  dimension "d48" = 65
  dimension "d51" = 85
extrude "Extrusion4" cut sketch "Sketch6" against normal blind 10
properties part number "Body_Bottom"
